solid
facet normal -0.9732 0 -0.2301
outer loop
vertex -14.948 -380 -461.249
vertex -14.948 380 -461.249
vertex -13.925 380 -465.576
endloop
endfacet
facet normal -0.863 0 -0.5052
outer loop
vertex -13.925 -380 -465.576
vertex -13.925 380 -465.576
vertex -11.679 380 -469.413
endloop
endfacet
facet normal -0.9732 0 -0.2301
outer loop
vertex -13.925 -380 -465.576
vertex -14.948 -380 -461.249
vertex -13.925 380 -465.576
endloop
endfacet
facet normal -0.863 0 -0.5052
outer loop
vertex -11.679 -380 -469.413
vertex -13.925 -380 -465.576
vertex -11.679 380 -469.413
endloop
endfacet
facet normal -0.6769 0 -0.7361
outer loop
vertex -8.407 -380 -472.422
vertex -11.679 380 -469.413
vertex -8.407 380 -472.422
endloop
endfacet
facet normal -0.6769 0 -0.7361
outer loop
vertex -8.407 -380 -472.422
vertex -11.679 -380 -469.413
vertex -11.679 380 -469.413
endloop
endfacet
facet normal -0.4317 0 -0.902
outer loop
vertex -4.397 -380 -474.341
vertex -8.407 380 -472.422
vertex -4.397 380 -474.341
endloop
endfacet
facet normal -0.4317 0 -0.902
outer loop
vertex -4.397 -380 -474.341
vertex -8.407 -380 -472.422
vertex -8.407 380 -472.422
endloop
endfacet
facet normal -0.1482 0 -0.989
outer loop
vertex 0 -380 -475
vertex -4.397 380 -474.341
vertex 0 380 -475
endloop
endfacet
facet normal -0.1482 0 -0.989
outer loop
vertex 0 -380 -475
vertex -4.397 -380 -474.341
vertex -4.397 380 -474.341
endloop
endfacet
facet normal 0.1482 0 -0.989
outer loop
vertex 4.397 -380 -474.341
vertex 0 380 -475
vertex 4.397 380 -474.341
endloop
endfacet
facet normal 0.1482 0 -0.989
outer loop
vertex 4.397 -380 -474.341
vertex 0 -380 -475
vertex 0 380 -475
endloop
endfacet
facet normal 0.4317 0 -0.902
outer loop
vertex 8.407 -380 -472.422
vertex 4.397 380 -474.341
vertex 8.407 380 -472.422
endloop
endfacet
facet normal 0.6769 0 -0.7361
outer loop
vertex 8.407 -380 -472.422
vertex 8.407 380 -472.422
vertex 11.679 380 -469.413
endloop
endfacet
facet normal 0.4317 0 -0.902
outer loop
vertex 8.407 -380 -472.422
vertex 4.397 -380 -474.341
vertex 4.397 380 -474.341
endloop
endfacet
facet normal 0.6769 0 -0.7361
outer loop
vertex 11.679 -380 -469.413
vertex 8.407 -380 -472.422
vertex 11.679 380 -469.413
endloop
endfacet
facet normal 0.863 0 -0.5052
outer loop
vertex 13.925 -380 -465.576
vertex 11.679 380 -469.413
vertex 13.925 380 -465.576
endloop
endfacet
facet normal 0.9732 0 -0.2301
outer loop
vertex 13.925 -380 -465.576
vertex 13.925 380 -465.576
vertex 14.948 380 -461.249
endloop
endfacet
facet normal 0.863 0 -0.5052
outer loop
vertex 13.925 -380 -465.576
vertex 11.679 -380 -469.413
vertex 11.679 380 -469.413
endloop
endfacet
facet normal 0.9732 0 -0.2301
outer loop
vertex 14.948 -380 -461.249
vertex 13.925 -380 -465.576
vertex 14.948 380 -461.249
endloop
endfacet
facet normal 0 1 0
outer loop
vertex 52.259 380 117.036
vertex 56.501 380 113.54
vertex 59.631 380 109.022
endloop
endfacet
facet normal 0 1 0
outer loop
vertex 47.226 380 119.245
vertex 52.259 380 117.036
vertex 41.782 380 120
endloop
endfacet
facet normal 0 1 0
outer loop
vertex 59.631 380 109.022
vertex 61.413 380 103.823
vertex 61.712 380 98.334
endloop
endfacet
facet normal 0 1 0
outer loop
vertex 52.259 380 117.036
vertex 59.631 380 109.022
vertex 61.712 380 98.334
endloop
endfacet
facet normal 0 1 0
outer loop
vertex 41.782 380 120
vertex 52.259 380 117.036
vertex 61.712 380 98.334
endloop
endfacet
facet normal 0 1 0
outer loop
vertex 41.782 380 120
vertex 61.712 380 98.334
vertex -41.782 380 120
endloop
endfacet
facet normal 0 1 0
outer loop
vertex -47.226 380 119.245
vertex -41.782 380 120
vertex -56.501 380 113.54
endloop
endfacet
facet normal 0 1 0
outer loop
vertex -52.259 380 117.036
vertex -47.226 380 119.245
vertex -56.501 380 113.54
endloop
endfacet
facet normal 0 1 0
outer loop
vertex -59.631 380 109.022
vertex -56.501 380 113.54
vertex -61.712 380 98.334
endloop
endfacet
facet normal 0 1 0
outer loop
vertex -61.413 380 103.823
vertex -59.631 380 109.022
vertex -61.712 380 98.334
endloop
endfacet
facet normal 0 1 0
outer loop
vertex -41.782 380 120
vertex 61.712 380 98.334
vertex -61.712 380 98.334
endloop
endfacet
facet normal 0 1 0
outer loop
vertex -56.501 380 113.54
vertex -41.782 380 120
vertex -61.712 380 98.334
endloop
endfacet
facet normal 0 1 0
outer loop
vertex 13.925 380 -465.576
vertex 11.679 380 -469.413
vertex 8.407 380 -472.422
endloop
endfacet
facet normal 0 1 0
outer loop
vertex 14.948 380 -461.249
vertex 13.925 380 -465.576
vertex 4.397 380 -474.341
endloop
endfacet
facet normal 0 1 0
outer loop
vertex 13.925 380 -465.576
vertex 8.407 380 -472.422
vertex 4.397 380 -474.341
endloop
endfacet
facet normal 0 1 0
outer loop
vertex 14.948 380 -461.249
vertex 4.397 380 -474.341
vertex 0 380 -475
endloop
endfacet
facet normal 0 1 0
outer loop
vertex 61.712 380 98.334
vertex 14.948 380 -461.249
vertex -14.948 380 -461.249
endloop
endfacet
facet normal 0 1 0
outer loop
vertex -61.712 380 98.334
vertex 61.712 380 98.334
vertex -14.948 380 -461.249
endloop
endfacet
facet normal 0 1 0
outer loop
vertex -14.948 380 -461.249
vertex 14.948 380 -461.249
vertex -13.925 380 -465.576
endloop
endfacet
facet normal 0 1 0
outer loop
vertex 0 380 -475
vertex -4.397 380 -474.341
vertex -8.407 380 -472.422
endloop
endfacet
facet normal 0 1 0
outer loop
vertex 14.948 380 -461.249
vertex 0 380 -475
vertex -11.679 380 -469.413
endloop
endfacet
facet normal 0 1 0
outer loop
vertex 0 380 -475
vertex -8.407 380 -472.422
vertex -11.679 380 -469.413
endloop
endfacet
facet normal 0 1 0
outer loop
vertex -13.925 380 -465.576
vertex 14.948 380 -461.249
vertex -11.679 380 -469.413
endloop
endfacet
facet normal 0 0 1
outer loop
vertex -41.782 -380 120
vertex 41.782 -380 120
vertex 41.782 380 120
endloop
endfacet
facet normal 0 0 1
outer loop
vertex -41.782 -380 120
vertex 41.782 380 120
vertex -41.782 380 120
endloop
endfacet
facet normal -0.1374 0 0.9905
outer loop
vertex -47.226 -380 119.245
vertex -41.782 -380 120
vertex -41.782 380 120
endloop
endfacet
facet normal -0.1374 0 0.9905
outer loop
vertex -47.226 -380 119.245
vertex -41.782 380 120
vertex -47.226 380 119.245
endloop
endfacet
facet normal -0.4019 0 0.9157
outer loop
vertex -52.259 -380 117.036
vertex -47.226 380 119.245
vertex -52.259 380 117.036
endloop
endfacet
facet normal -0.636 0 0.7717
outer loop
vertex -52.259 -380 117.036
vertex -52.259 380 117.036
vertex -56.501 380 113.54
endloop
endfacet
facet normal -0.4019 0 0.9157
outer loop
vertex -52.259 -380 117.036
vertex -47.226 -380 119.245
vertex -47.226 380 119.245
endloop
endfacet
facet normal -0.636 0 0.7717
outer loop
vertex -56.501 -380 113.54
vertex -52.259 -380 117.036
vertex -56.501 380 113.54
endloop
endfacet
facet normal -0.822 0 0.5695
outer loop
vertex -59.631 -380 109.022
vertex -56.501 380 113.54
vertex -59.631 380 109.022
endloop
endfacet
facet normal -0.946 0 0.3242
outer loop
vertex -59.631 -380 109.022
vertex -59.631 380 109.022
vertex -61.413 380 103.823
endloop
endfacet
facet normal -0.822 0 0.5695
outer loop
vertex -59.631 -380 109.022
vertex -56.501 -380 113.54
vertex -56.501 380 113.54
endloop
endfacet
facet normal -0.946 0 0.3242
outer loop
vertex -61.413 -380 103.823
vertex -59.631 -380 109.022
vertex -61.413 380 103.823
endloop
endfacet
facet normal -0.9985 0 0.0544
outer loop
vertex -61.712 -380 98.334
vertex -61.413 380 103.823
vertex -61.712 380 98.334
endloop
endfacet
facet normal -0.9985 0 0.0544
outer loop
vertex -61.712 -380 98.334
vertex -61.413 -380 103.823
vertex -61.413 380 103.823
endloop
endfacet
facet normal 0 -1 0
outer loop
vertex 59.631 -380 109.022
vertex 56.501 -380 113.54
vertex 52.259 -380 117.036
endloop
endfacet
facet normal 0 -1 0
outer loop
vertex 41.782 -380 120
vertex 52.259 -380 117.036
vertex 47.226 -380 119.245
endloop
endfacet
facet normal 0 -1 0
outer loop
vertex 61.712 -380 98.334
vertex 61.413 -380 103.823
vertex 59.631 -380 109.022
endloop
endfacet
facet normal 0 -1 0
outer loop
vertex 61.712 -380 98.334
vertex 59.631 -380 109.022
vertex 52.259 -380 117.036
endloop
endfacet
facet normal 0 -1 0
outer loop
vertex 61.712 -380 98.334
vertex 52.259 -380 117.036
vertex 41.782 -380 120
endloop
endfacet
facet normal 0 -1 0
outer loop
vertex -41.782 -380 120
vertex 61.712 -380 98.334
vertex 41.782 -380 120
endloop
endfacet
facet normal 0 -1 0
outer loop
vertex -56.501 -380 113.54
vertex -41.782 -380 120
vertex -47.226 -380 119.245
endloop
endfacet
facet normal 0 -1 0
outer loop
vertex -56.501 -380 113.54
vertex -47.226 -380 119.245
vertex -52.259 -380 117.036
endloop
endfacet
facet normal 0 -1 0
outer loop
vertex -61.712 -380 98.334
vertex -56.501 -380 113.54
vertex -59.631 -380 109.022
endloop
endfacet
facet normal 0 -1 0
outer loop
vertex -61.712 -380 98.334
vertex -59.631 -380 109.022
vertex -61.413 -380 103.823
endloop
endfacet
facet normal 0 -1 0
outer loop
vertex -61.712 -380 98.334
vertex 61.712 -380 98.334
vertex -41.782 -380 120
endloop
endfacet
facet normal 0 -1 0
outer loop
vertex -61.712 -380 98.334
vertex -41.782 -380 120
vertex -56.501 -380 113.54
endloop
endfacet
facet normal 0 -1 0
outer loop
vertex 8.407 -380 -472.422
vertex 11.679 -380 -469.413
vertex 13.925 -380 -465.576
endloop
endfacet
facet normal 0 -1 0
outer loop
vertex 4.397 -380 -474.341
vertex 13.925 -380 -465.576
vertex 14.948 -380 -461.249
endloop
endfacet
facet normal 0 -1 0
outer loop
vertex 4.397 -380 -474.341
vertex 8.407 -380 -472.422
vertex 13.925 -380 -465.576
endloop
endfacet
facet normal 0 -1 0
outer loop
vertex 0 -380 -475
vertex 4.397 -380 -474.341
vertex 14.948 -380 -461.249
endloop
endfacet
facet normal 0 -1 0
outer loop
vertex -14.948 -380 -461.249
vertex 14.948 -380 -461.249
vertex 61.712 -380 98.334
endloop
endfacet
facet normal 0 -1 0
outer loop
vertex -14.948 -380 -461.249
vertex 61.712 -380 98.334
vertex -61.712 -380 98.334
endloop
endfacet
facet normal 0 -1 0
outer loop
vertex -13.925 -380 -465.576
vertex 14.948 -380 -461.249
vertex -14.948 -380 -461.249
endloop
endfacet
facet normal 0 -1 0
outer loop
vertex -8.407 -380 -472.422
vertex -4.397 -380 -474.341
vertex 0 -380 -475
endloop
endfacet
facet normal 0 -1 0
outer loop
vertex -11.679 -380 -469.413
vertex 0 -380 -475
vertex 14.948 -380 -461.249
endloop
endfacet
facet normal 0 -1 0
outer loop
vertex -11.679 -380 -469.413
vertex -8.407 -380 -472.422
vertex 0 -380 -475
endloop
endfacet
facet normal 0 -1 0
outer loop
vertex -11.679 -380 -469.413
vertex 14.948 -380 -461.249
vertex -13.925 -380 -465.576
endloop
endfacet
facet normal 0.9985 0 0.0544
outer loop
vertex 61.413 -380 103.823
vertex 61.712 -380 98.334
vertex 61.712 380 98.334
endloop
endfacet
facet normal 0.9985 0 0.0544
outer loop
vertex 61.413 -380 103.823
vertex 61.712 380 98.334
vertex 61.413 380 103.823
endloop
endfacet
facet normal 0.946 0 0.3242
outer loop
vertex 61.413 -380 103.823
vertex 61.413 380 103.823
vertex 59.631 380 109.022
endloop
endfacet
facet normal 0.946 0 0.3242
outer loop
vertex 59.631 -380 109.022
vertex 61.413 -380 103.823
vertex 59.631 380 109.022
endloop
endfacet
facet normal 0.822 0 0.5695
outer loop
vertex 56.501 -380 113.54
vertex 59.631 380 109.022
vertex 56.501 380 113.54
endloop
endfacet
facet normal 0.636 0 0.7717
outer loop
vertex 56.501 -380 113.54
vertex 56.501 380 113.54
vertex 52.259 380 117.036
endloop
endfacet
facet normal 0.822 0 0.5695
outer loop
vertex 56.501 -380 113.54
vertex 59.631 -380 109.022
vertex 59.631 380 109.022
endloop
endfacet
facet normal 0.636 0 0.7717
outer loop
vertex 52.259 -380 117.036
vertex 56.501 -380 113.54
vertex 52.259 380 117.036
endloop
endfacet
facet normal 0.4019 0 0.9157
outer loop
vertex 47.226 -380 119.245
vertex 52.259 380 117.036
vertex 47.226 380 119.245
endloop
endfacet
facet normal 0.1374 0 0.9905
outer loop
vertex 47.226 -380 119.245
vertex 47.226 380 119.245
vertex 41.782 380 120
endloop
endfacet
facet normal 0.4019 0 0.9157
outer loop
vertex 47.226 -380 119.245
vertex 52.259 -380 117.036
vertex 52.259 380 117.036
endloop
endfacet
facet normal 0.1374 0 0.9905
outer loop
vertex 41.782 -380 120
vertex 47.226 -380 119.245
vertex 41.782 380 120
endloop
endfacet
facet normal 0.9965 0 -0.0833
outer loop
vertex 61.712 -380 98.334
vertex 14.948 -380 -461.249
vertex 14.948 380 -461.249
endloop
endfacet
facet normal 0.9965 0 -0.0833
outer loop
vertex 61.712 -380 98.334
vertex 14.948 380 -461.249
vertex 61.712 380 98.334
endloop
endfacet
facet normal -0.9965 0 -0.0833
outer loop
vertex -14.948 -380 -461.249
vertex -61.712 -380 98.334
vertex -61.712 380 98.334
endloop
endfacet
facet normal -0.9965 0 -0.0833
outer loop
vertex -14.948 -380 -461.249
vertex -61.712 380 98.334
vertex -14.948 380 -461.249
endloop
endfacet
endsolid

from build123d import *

# Parameters (mm, degrees)
BOSS_EXTRUDE1_DEPTH      = 380
BOSS_EXTRUDE1_DEPTH_BACK = 380


with BuildPart() as part:
    # Sketch1 → Boss-Extrude1 (new, two sides: drawn at the far end of the back side and taken through both)
    with BuildSketch(Plane(origin=(0, 0, 0), x_dir=(1, 0, 0), z_dir=(0, 1, 0)).offset(-BOSS_EXTRUDE1_DEPTH_BACK)):
        with BuildLine():
            Line((-61.712368752, -98.334403464), (-14.947893024, 461.249197402))
            ThreePointArc((-14.947893024, 461.249197402), (0, 475), (14.947893024, 461.249197402))
            Line((14.947893024, 461.249197402), (61.712368752, -98.334403464))
            ThreePointArc((61.712368752, -98.334403464), (56.501082654, -113.540459174), (41.78184472, -120))
            Line((41.78184472, -120), (-41.78184472, -120))
            ThreePointArc((-41.78184472, -120), (-56.501082654, -113.540459174), (-61.712368752, -98.334403464))
        make_face()
    extrude(amount=BOSS_EXTRUDE1_DEPTH + BOSS_EXTRUDE1_DEPTH_BACK)


solid = part.part
